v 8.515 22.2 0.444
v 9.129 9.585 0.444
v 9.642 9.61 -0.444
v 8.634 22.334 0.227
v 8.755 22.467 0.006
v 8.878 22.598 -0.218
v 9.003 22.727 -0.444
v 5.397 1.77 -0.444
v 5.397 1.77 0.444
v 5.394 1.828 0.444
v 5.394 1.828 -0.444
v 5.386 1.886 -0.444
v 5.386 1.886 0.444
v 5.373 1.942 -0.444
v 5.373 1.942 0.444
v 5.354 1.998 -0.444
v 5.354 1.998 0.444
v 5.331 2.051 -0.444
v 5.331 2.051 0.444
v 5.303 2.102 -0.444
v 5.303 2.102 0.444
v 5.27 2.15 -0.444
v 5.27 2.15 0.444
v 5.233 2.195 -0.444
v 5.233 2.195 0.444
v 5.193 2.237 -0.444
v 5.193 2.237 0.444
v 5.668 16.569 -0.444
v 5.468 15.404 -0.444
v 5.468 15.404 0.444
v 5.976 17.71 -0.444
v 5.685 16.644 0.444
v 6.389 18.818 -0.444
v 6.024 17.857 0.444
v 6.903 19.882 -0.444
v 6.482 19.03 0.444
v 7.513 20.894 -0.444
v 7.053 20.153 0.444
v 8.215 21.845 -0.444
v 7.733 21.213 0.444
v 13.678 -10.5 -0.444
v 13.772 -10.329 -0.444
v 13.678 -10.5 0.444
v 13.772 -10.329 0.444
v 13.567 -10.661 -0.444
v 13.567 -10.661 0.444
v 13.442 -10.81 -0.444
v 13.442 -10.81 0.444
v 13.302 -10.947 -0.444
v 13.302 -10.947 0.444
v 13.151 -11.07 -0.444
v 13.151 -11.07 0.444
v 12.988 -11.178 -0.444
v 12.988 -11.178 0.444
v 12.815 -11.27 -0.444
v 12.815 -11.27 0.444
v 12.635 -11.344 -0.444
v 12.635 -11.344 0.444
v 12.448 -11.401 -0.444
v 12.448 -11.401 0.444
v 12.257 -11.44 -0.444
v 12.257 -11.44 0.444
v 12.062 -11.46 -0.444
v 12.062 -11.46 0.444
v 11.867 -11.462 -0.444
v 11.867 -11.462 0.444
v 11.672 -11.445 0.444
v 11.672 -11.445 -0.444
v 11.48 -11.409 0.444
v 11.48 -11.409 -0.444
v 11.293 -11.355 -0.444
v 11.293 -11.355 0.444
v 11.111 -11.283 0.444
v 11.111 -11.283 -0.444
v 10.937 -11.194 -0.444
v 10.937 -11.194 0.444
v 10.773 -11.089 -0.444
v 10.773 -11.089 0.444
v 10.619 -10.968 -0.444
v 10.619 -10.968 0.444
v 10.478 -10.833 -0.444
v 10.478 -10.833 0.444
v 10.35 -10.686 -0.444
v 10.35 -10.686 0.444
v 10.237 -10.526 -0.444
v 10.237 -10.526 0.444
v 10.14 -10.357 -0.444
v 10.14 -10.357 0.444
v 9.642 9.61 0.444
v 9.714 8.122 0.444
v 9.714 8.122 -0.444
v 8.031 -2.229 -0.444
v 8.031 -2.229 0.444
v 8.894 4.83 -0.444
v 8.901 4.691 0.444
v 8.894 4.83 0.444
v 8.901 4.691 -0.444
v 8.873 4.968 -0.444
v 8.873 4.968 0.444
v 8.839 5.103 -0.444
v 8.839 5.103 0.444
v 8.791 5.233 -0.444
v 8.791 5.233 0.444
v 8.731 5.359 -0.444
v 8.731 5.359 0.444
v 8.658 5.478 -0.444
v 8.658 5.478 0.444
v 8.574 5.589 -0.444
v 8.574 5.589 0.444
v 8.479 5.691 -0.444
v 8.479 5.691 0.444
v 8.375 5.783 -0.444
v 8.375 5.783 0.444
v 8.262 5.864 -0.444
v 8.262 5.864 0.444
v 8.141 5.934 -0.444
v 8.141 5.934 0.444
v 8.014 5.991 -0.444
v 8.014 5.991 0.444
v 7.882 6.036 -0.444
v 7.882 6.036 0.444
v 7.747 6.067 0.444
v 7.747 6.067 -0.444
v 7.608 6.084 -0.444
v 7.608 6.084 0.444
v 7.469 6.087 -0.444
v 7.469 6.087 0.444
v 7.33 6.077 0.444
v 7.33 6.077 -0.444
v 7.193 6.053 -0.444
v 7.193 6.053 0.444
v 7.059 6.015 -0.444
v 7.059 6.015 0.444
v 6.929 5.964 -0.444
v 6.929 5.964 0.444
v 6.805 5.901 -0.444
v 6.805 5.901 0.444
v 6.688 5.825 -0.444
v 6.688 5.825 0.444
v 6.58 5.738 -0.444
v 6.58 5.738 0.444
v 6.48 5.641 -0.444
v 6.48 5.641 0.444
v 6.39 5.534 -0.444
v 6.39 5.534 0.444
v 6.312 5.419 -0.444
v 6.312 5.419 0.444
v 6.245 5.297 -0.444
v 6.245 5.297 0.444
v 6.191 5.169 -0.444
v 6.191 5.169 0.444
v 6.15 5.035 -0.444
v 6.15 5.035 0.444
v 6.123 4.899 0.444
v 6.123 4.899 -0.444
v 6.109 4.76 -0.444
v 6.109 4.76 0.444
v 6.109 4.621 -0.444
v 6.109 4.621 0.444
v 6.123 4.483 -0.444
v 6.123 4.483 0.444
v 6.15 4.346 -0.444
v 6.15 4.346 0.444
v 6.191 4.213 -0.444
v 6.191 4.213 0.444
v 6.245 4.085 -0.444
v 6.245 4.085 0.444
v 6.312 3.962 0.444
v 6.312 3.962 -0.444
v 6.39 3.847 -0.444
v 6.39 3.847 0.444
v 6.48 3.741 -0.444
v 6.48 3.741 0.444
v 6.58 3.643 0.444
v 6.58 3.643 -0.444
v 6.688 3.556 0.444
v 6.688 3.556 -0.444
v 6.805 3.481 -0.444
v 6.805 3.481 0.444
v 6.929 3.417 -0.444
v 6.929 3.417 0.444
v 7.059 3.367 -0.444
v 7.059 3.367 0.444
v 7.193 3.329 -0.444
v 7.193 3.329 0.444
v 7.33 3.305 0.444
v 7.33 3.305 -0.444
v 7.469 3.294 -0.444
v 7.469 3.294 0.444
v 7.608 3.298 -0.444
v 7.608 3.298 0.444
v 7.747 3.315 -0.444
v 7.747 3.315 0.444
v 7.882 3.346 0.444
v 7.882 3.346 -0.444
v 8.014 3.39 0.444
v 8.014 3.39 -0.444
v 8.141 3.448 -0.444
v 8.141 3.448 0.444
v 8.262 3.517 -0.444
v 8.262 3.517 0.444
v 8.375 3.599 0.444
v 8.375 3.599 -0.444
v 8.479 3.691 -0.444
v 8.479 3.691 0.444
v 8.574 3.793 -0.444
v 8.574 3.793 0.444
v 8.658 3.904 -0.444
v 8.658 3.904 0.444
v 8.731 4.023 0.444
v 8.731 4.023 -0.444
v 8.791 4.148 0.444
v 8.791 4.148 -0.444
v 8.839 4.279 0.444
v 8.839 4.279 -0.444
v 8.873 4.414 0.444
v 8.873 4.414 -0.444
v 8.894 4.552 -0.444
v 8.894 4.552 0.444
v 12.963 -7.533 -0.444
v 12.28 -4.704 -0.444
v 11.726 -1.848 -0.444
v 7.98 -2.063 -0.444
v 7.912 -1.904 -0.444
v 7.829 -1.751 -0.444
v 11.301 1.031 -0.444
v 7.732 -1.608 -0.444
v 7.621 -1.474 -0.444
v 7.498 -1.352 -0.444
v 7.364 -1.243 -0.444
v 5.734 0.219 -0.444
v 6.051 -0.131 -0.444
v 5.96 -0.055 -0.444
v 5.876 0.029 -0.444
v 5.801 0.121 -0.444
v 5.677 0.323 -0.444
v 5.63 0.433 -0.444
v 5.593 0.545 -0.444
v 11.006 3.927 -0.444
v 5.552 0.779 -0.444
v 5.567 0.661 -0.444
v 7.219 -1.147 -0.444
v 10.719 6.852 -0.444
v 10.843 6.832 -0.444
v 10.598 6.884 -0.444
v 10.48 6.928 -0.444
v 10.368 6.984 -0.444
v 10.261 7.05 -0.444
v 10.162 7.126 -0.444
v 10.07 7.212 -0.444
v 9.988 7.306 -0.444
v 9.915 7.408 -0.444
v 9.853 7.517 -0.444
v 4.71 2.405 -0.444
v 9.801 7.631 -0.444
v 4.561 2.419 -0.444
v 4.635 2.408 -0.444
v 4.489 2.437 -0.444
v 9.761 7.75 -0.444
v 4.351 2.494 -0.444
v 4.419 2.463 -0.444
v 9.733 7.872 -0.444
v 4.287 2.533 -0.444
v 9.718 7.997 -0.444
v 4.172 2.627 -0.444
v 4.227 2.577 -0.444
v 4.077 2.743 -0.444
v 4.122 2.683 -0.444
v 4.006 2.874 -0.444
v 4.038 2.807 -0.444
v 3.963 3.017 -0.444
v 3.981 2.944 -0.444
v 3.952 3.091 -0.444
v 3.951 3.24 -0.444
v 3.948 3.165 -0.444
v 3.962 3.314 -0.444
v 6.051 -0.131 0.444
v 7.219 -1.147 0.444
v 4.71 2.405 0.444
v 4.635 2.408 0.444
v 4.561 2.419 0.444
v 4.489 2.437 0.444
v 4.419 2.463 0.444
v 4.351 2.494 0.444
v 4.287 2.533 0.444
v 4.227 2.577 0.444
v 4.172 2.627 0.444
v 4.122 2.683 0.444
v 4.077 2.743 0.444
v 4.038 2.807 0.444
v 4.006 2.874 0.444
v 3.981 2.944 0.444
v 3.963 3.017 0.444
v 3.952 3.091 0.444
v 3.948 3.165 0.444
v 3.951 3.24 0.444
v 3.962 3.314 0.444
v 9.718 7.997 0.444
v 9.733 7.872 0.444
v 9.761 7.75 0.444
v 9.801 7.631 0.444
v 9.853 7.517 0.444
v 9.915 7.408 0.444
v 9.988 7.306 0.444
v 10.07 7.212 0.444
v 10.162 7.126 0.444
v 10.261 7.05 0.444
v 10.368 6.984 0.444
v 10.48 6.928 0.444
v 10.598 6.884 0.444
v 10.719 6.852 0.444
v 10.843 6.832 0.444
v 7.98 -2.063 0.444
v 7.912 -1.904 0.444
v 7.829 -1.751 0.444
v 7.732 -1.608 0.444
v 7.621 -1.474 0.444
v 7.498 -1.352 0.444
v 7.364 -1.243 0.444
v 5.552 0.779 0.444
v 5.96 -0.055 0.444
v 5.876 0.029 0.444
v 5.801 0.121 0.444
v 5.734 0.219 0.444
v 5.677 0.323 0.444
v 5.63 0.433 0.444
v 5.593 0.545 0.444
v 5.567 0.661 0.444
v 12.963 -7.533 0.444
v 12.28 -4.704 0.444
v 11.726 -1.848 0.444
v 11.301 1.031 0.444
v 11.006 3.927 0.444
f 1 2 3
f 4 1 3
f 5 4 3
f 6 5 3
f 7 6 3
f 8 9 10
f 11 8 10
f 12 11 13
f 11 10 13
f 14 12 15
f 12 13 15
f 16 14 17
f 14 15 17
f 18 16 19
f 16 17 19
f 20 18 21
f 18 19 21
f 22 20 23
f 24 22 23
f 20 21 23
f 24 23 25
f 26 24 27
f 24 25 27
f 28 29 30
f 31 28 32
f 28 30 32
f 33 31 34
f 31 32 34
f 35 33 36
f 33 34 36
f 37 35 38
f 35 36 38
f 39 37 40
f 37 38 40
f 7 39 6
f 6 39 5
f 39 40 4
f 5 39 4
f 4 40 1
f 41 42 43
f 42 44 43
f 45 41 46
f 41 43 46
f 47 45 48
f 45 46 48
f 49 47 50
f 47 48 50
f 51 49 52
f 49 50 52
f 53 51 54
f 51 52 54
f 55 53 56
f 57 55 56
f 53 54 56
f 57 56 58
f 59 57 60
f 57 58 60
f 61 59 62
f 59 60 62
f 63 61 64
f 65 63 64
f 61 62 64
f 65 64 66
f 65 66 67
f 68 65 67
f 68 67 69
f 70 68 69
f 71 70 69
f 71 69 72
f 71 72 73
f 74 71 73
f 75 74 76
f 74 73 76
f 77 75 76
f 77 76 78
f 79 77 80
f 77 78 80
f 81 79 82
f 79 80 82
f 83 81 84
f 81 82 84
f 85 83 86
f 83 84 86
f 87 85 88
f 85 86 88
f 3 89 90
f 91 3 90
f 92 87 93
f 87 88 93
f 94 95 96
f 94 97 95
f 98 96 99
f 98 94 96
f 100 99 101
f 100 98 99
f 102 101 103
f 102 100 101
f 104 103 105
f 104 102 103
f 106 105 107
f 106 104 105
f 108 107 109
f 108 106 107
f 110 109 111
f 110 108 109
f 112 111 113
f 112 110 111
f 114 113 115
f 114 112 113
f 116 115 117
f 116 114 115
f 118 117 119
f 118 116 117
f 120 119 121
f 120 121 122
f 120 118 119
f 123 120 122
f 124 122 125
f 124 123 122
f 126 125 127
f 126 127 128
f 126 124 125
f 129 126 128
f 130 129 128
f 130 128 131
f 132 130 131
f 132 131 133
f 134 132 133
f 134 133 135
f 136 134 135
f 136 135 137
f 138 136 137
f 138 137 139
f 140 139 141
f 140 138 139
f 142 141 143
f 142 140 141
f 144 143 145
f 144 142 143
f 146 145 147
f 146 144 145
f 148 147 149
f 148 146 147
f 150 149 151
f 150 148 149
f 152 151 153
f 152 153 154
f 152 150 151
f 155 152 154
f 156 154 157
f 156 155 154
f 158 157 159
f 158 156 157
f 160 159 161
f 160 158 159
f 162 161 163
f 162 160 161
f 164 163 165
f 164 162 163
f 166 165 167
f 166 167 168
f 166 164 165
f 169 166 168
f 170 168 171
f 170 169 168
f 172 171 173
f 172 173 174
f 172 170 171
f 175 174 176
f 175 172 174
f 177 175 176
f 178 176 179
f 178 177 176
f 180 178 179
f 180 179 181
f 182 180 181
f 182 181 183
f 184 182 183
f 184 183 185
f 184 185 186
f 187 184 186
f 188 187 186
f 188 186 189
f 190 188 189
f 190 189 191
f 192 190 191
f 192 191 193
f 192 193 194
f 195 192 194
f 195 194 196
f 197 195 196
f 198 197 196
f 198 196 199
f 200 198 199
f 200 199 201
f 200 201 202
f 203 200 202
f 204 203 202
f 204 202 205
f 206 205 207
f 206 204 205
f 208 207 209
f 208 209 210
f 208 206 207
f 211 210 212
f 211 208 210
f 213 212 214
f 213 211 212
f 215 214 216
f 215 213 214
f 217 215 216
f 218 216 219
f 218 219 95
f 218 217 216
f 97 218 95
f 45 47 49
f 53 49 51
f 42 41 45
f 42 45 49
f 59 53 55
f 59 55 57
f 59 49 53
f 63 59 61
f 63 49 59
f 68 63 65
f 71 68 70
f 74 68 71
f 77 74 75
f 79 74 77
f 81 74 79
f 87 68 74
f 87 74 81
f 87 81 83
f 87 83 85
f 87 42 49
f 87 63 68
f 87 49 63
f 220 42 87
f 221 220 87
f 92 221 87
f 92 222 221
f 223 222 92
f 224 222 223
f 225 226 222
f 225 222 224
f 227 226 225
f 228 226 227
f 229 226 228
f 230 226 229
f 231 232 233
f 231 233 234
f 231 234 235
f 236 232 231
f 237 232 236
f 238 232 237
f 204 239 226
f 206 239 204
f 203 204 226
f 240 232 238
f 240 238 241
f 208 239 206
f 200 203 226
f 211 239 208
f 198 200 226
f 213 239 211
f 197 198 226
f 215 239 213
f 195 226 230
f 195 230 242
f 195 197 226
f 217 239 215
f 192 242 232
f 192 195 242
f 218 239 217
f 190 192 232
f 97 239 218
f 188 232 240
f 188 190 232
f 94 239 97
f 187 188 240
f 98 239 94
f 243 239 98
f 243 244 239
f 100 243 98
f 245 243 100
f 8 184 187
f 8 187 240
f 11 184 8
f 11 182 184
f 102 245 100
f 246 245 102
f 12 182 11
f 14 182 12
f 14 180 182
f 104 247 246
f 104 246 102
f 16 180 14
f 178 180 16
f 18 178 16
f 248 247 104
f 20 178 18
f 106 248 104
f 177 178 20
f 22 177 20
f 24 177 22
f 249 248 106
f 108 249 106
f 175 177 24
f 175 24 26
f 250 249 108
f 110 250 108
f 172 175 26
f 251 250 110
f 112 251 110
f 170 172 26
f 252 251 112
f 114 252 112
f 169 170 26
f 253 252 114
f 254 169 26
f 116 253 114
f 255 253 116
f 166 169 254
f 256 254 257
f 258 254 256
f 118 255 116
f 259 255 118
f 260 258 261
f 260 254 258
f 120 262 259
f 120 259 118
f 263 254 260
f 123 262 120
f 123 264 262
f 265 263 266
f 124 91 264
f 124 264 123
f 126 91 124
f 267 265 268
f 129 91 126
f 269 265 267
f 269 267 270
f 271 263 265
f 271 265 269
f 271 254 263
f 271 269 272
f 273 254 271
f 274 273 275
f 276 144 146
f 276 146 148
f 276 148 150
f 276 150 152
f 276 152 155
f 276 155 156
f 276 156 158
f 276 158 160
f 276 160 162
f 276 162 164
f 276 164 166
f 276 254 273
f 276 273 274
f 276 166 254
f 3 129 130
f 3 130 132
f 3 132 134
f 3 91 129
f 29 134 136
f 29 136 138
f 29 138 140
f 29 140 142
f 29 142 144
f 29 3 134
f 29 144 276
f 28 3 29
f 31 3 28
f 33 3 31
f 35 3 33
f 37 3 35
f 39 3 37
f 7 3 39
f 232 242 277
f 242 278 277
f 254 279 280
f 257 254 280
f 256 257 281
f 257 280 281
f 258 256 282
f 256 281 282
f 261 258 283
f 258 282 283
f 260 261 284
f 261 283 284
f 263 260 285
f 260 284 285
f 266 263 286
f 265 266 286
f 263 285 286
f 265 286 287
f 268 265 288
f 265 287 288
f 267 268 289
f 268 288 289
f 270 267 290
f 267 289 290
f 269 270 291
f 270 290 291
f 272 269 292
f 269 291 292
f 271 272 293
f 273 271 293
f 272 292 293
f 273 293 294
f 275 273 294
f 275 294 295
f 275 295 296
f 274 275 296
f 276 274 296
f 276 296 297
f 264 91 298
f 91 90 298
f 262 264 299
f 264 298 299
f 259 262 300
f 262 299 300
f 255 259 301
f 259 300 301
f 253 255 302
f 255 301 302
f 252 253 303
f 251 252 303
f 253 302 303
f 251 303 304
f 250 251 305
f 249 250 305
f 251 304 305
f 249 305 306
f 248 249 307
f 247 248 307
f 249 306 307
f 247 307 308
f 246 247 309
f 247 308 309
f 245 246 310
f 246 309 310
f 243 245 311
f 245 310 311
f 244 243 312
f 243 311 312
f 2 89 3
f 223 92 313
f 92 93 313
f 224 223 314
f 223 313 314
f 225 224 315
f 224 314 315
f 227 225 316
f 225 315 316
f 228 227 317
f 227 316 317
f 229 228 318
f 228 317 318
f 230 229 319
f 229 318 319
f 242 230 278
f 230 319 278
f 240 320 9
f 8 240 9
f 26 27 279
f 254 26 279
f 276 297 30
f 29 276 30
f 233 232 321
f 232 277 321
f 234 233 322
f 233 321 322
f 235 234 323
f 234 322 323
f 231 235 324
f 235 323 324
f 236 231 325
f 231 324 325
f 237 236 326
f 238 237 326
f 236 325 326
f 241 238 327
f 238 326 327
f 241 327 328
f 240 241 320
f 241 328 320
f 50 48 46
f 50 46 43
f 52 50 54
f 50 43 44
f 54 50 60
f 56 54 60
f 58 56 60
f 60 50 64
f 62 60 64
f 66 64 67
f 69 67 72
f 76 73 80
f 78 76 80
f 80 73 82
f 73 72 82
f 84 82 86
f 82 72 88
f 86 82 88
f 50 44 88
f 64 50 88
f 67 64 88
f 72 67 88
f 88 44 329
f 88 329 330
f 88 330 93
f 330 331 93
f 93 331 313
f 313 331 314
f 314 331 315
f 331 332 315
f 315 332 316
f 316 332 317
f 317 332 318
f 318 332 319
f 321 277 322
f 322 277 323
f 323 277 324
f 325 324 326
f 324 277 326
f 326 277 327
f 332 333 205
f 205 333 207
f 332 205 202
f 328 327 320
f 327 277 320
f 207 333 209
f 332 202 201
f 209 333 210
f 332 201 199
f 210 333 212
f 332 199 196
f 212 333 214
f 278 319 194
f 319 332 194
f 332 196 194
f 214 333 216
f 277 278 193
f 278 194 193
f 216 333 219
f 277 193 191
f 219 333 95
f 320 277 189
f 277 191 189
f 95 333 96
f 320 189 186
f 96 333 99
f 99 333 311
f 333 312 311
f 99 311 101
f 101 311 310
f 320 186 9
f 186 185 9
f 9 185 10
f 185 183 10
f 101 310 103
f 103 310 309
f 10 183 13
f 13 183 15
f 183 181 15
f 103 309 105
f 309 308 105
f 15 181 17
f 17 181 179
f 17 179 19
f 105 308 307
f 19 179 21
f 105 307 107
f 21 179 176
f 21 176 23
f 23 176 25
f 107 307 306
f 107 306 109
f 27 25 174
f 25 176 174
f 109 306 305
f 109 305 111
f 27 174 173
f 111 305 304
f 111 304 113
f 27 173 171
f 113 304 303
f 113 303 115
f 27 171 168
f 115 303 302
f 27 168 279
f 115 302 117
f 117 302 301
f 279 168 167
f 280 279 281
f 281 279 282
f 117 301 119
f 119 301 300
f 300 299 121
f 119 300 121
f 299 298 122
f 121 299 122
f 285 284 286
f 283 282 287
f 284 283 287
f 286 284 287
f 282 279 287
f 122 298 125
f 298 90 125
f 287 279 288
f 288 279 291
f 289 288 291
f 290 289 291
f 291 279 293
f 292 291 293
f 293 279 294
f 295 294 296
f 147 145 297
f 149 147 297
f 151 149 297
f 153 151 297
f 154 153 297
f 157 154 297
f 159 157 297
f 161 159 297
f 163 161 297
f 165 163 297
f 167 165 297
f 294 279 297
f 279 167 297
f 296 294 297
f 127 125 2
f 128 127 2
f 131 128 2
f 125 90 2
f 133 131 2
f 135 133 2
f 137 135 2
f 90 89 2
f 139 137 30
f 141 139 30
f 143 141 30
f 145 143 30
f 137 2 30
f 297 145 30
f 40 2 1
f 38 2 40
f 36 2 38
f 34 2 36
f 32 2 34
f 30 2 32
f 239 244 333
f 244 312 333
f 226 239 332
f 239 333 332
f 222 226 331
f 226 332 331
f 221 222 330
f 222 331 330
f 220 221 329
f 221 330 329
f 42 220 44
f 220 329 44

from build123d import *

# Parameters (mm, degrees)
SKETCH1_R           = 1.397
BOSS_EXTRUDE1_DEPTH = 0.4445
CUT_EXTRUDE4_DEPTH  = 16.51


with BuildPart() as part:
    # Sketch1 → Boss-Extrude1 (new body, symmetric)
    with BuildSketch(Plane.XY):
        with BuildLine():
            Line((9.00284972, 22.726912505), (9.71404972, 8.121912505))
            ThreePointArc((9.71404972, 8.121912505), (10.028030629, 7.257996655), (10.842675562, 6.832217089))
            ThreePointArc((10.842675562, 6.832217089), (11.725921803, -1.84754774), (13.772182249, -10.328777579))
            ThreePointArc((13.772182249, -10.328777579), (11.964609342, -11.463582415), (10.13976202, -10.356769839))
            Line((10.13976202, -10.356769839), (8.031181239, -2.228769839))
            ThreePointArc((8.031181239, -2.228769839), (7.732027762, -1.607745785), (7.219155962, -1.147174187))
            Line((7.219155962, -1.147174187), (6.050755962, -0.131174187))
            ThreePointArc((6.050755962, -0.131174187), (5.704248725, 0.270738994), (5.552221275, 0.779157252))
            Line((5.552221275, 0.779157252), (5.396674082, 1.769757252))
            ThreePointArc((5.396674082, 1.769757252), (5.343412822, 2.024518698), (5.192550751, 2.236605453))
            Line((5.192550751, 2.236605453), (4.709950751, 2.404757252))
            ThreePointArc((4.709950751, 2.404757252), (4.121509293, 2.682628498), (3.962230463, 3.313584941))
            Line((3.962230463, 3.313584941), (5.467671494, 15.403984941))
            ThreePointArc((5.467671494, 15.403984941), (6.633327736, 19.356034689), (9.00284972, 22.726912505))
        make_face()
        with Locations((7.503950751, 4.690757252)):
            Circle(SKETCH1_R, mode=Mode.SUBTRACT)
    extrude(amount=BOSS_EXTRUDE1_DEPTH, both=True)

    # Sketch2 → Cut-Extrude4 (cut)
    with BuildSketch(Plane(origin=(-1.247053398, 25.609132285, 0), x_dir=(0.998816471, 0.048638019, 0), z_dir=(-0.048638019, 0.998816471, 0))):
        Polygon((10.097586601, 0.4445), (10.097586601, -0.4445), (9.584322211, -0.4445), align=None)
    extrude(amount=-CUT_EXTRUDE4_DEPTH, mode=Mode.SUBTRACT)


solid = part.part
